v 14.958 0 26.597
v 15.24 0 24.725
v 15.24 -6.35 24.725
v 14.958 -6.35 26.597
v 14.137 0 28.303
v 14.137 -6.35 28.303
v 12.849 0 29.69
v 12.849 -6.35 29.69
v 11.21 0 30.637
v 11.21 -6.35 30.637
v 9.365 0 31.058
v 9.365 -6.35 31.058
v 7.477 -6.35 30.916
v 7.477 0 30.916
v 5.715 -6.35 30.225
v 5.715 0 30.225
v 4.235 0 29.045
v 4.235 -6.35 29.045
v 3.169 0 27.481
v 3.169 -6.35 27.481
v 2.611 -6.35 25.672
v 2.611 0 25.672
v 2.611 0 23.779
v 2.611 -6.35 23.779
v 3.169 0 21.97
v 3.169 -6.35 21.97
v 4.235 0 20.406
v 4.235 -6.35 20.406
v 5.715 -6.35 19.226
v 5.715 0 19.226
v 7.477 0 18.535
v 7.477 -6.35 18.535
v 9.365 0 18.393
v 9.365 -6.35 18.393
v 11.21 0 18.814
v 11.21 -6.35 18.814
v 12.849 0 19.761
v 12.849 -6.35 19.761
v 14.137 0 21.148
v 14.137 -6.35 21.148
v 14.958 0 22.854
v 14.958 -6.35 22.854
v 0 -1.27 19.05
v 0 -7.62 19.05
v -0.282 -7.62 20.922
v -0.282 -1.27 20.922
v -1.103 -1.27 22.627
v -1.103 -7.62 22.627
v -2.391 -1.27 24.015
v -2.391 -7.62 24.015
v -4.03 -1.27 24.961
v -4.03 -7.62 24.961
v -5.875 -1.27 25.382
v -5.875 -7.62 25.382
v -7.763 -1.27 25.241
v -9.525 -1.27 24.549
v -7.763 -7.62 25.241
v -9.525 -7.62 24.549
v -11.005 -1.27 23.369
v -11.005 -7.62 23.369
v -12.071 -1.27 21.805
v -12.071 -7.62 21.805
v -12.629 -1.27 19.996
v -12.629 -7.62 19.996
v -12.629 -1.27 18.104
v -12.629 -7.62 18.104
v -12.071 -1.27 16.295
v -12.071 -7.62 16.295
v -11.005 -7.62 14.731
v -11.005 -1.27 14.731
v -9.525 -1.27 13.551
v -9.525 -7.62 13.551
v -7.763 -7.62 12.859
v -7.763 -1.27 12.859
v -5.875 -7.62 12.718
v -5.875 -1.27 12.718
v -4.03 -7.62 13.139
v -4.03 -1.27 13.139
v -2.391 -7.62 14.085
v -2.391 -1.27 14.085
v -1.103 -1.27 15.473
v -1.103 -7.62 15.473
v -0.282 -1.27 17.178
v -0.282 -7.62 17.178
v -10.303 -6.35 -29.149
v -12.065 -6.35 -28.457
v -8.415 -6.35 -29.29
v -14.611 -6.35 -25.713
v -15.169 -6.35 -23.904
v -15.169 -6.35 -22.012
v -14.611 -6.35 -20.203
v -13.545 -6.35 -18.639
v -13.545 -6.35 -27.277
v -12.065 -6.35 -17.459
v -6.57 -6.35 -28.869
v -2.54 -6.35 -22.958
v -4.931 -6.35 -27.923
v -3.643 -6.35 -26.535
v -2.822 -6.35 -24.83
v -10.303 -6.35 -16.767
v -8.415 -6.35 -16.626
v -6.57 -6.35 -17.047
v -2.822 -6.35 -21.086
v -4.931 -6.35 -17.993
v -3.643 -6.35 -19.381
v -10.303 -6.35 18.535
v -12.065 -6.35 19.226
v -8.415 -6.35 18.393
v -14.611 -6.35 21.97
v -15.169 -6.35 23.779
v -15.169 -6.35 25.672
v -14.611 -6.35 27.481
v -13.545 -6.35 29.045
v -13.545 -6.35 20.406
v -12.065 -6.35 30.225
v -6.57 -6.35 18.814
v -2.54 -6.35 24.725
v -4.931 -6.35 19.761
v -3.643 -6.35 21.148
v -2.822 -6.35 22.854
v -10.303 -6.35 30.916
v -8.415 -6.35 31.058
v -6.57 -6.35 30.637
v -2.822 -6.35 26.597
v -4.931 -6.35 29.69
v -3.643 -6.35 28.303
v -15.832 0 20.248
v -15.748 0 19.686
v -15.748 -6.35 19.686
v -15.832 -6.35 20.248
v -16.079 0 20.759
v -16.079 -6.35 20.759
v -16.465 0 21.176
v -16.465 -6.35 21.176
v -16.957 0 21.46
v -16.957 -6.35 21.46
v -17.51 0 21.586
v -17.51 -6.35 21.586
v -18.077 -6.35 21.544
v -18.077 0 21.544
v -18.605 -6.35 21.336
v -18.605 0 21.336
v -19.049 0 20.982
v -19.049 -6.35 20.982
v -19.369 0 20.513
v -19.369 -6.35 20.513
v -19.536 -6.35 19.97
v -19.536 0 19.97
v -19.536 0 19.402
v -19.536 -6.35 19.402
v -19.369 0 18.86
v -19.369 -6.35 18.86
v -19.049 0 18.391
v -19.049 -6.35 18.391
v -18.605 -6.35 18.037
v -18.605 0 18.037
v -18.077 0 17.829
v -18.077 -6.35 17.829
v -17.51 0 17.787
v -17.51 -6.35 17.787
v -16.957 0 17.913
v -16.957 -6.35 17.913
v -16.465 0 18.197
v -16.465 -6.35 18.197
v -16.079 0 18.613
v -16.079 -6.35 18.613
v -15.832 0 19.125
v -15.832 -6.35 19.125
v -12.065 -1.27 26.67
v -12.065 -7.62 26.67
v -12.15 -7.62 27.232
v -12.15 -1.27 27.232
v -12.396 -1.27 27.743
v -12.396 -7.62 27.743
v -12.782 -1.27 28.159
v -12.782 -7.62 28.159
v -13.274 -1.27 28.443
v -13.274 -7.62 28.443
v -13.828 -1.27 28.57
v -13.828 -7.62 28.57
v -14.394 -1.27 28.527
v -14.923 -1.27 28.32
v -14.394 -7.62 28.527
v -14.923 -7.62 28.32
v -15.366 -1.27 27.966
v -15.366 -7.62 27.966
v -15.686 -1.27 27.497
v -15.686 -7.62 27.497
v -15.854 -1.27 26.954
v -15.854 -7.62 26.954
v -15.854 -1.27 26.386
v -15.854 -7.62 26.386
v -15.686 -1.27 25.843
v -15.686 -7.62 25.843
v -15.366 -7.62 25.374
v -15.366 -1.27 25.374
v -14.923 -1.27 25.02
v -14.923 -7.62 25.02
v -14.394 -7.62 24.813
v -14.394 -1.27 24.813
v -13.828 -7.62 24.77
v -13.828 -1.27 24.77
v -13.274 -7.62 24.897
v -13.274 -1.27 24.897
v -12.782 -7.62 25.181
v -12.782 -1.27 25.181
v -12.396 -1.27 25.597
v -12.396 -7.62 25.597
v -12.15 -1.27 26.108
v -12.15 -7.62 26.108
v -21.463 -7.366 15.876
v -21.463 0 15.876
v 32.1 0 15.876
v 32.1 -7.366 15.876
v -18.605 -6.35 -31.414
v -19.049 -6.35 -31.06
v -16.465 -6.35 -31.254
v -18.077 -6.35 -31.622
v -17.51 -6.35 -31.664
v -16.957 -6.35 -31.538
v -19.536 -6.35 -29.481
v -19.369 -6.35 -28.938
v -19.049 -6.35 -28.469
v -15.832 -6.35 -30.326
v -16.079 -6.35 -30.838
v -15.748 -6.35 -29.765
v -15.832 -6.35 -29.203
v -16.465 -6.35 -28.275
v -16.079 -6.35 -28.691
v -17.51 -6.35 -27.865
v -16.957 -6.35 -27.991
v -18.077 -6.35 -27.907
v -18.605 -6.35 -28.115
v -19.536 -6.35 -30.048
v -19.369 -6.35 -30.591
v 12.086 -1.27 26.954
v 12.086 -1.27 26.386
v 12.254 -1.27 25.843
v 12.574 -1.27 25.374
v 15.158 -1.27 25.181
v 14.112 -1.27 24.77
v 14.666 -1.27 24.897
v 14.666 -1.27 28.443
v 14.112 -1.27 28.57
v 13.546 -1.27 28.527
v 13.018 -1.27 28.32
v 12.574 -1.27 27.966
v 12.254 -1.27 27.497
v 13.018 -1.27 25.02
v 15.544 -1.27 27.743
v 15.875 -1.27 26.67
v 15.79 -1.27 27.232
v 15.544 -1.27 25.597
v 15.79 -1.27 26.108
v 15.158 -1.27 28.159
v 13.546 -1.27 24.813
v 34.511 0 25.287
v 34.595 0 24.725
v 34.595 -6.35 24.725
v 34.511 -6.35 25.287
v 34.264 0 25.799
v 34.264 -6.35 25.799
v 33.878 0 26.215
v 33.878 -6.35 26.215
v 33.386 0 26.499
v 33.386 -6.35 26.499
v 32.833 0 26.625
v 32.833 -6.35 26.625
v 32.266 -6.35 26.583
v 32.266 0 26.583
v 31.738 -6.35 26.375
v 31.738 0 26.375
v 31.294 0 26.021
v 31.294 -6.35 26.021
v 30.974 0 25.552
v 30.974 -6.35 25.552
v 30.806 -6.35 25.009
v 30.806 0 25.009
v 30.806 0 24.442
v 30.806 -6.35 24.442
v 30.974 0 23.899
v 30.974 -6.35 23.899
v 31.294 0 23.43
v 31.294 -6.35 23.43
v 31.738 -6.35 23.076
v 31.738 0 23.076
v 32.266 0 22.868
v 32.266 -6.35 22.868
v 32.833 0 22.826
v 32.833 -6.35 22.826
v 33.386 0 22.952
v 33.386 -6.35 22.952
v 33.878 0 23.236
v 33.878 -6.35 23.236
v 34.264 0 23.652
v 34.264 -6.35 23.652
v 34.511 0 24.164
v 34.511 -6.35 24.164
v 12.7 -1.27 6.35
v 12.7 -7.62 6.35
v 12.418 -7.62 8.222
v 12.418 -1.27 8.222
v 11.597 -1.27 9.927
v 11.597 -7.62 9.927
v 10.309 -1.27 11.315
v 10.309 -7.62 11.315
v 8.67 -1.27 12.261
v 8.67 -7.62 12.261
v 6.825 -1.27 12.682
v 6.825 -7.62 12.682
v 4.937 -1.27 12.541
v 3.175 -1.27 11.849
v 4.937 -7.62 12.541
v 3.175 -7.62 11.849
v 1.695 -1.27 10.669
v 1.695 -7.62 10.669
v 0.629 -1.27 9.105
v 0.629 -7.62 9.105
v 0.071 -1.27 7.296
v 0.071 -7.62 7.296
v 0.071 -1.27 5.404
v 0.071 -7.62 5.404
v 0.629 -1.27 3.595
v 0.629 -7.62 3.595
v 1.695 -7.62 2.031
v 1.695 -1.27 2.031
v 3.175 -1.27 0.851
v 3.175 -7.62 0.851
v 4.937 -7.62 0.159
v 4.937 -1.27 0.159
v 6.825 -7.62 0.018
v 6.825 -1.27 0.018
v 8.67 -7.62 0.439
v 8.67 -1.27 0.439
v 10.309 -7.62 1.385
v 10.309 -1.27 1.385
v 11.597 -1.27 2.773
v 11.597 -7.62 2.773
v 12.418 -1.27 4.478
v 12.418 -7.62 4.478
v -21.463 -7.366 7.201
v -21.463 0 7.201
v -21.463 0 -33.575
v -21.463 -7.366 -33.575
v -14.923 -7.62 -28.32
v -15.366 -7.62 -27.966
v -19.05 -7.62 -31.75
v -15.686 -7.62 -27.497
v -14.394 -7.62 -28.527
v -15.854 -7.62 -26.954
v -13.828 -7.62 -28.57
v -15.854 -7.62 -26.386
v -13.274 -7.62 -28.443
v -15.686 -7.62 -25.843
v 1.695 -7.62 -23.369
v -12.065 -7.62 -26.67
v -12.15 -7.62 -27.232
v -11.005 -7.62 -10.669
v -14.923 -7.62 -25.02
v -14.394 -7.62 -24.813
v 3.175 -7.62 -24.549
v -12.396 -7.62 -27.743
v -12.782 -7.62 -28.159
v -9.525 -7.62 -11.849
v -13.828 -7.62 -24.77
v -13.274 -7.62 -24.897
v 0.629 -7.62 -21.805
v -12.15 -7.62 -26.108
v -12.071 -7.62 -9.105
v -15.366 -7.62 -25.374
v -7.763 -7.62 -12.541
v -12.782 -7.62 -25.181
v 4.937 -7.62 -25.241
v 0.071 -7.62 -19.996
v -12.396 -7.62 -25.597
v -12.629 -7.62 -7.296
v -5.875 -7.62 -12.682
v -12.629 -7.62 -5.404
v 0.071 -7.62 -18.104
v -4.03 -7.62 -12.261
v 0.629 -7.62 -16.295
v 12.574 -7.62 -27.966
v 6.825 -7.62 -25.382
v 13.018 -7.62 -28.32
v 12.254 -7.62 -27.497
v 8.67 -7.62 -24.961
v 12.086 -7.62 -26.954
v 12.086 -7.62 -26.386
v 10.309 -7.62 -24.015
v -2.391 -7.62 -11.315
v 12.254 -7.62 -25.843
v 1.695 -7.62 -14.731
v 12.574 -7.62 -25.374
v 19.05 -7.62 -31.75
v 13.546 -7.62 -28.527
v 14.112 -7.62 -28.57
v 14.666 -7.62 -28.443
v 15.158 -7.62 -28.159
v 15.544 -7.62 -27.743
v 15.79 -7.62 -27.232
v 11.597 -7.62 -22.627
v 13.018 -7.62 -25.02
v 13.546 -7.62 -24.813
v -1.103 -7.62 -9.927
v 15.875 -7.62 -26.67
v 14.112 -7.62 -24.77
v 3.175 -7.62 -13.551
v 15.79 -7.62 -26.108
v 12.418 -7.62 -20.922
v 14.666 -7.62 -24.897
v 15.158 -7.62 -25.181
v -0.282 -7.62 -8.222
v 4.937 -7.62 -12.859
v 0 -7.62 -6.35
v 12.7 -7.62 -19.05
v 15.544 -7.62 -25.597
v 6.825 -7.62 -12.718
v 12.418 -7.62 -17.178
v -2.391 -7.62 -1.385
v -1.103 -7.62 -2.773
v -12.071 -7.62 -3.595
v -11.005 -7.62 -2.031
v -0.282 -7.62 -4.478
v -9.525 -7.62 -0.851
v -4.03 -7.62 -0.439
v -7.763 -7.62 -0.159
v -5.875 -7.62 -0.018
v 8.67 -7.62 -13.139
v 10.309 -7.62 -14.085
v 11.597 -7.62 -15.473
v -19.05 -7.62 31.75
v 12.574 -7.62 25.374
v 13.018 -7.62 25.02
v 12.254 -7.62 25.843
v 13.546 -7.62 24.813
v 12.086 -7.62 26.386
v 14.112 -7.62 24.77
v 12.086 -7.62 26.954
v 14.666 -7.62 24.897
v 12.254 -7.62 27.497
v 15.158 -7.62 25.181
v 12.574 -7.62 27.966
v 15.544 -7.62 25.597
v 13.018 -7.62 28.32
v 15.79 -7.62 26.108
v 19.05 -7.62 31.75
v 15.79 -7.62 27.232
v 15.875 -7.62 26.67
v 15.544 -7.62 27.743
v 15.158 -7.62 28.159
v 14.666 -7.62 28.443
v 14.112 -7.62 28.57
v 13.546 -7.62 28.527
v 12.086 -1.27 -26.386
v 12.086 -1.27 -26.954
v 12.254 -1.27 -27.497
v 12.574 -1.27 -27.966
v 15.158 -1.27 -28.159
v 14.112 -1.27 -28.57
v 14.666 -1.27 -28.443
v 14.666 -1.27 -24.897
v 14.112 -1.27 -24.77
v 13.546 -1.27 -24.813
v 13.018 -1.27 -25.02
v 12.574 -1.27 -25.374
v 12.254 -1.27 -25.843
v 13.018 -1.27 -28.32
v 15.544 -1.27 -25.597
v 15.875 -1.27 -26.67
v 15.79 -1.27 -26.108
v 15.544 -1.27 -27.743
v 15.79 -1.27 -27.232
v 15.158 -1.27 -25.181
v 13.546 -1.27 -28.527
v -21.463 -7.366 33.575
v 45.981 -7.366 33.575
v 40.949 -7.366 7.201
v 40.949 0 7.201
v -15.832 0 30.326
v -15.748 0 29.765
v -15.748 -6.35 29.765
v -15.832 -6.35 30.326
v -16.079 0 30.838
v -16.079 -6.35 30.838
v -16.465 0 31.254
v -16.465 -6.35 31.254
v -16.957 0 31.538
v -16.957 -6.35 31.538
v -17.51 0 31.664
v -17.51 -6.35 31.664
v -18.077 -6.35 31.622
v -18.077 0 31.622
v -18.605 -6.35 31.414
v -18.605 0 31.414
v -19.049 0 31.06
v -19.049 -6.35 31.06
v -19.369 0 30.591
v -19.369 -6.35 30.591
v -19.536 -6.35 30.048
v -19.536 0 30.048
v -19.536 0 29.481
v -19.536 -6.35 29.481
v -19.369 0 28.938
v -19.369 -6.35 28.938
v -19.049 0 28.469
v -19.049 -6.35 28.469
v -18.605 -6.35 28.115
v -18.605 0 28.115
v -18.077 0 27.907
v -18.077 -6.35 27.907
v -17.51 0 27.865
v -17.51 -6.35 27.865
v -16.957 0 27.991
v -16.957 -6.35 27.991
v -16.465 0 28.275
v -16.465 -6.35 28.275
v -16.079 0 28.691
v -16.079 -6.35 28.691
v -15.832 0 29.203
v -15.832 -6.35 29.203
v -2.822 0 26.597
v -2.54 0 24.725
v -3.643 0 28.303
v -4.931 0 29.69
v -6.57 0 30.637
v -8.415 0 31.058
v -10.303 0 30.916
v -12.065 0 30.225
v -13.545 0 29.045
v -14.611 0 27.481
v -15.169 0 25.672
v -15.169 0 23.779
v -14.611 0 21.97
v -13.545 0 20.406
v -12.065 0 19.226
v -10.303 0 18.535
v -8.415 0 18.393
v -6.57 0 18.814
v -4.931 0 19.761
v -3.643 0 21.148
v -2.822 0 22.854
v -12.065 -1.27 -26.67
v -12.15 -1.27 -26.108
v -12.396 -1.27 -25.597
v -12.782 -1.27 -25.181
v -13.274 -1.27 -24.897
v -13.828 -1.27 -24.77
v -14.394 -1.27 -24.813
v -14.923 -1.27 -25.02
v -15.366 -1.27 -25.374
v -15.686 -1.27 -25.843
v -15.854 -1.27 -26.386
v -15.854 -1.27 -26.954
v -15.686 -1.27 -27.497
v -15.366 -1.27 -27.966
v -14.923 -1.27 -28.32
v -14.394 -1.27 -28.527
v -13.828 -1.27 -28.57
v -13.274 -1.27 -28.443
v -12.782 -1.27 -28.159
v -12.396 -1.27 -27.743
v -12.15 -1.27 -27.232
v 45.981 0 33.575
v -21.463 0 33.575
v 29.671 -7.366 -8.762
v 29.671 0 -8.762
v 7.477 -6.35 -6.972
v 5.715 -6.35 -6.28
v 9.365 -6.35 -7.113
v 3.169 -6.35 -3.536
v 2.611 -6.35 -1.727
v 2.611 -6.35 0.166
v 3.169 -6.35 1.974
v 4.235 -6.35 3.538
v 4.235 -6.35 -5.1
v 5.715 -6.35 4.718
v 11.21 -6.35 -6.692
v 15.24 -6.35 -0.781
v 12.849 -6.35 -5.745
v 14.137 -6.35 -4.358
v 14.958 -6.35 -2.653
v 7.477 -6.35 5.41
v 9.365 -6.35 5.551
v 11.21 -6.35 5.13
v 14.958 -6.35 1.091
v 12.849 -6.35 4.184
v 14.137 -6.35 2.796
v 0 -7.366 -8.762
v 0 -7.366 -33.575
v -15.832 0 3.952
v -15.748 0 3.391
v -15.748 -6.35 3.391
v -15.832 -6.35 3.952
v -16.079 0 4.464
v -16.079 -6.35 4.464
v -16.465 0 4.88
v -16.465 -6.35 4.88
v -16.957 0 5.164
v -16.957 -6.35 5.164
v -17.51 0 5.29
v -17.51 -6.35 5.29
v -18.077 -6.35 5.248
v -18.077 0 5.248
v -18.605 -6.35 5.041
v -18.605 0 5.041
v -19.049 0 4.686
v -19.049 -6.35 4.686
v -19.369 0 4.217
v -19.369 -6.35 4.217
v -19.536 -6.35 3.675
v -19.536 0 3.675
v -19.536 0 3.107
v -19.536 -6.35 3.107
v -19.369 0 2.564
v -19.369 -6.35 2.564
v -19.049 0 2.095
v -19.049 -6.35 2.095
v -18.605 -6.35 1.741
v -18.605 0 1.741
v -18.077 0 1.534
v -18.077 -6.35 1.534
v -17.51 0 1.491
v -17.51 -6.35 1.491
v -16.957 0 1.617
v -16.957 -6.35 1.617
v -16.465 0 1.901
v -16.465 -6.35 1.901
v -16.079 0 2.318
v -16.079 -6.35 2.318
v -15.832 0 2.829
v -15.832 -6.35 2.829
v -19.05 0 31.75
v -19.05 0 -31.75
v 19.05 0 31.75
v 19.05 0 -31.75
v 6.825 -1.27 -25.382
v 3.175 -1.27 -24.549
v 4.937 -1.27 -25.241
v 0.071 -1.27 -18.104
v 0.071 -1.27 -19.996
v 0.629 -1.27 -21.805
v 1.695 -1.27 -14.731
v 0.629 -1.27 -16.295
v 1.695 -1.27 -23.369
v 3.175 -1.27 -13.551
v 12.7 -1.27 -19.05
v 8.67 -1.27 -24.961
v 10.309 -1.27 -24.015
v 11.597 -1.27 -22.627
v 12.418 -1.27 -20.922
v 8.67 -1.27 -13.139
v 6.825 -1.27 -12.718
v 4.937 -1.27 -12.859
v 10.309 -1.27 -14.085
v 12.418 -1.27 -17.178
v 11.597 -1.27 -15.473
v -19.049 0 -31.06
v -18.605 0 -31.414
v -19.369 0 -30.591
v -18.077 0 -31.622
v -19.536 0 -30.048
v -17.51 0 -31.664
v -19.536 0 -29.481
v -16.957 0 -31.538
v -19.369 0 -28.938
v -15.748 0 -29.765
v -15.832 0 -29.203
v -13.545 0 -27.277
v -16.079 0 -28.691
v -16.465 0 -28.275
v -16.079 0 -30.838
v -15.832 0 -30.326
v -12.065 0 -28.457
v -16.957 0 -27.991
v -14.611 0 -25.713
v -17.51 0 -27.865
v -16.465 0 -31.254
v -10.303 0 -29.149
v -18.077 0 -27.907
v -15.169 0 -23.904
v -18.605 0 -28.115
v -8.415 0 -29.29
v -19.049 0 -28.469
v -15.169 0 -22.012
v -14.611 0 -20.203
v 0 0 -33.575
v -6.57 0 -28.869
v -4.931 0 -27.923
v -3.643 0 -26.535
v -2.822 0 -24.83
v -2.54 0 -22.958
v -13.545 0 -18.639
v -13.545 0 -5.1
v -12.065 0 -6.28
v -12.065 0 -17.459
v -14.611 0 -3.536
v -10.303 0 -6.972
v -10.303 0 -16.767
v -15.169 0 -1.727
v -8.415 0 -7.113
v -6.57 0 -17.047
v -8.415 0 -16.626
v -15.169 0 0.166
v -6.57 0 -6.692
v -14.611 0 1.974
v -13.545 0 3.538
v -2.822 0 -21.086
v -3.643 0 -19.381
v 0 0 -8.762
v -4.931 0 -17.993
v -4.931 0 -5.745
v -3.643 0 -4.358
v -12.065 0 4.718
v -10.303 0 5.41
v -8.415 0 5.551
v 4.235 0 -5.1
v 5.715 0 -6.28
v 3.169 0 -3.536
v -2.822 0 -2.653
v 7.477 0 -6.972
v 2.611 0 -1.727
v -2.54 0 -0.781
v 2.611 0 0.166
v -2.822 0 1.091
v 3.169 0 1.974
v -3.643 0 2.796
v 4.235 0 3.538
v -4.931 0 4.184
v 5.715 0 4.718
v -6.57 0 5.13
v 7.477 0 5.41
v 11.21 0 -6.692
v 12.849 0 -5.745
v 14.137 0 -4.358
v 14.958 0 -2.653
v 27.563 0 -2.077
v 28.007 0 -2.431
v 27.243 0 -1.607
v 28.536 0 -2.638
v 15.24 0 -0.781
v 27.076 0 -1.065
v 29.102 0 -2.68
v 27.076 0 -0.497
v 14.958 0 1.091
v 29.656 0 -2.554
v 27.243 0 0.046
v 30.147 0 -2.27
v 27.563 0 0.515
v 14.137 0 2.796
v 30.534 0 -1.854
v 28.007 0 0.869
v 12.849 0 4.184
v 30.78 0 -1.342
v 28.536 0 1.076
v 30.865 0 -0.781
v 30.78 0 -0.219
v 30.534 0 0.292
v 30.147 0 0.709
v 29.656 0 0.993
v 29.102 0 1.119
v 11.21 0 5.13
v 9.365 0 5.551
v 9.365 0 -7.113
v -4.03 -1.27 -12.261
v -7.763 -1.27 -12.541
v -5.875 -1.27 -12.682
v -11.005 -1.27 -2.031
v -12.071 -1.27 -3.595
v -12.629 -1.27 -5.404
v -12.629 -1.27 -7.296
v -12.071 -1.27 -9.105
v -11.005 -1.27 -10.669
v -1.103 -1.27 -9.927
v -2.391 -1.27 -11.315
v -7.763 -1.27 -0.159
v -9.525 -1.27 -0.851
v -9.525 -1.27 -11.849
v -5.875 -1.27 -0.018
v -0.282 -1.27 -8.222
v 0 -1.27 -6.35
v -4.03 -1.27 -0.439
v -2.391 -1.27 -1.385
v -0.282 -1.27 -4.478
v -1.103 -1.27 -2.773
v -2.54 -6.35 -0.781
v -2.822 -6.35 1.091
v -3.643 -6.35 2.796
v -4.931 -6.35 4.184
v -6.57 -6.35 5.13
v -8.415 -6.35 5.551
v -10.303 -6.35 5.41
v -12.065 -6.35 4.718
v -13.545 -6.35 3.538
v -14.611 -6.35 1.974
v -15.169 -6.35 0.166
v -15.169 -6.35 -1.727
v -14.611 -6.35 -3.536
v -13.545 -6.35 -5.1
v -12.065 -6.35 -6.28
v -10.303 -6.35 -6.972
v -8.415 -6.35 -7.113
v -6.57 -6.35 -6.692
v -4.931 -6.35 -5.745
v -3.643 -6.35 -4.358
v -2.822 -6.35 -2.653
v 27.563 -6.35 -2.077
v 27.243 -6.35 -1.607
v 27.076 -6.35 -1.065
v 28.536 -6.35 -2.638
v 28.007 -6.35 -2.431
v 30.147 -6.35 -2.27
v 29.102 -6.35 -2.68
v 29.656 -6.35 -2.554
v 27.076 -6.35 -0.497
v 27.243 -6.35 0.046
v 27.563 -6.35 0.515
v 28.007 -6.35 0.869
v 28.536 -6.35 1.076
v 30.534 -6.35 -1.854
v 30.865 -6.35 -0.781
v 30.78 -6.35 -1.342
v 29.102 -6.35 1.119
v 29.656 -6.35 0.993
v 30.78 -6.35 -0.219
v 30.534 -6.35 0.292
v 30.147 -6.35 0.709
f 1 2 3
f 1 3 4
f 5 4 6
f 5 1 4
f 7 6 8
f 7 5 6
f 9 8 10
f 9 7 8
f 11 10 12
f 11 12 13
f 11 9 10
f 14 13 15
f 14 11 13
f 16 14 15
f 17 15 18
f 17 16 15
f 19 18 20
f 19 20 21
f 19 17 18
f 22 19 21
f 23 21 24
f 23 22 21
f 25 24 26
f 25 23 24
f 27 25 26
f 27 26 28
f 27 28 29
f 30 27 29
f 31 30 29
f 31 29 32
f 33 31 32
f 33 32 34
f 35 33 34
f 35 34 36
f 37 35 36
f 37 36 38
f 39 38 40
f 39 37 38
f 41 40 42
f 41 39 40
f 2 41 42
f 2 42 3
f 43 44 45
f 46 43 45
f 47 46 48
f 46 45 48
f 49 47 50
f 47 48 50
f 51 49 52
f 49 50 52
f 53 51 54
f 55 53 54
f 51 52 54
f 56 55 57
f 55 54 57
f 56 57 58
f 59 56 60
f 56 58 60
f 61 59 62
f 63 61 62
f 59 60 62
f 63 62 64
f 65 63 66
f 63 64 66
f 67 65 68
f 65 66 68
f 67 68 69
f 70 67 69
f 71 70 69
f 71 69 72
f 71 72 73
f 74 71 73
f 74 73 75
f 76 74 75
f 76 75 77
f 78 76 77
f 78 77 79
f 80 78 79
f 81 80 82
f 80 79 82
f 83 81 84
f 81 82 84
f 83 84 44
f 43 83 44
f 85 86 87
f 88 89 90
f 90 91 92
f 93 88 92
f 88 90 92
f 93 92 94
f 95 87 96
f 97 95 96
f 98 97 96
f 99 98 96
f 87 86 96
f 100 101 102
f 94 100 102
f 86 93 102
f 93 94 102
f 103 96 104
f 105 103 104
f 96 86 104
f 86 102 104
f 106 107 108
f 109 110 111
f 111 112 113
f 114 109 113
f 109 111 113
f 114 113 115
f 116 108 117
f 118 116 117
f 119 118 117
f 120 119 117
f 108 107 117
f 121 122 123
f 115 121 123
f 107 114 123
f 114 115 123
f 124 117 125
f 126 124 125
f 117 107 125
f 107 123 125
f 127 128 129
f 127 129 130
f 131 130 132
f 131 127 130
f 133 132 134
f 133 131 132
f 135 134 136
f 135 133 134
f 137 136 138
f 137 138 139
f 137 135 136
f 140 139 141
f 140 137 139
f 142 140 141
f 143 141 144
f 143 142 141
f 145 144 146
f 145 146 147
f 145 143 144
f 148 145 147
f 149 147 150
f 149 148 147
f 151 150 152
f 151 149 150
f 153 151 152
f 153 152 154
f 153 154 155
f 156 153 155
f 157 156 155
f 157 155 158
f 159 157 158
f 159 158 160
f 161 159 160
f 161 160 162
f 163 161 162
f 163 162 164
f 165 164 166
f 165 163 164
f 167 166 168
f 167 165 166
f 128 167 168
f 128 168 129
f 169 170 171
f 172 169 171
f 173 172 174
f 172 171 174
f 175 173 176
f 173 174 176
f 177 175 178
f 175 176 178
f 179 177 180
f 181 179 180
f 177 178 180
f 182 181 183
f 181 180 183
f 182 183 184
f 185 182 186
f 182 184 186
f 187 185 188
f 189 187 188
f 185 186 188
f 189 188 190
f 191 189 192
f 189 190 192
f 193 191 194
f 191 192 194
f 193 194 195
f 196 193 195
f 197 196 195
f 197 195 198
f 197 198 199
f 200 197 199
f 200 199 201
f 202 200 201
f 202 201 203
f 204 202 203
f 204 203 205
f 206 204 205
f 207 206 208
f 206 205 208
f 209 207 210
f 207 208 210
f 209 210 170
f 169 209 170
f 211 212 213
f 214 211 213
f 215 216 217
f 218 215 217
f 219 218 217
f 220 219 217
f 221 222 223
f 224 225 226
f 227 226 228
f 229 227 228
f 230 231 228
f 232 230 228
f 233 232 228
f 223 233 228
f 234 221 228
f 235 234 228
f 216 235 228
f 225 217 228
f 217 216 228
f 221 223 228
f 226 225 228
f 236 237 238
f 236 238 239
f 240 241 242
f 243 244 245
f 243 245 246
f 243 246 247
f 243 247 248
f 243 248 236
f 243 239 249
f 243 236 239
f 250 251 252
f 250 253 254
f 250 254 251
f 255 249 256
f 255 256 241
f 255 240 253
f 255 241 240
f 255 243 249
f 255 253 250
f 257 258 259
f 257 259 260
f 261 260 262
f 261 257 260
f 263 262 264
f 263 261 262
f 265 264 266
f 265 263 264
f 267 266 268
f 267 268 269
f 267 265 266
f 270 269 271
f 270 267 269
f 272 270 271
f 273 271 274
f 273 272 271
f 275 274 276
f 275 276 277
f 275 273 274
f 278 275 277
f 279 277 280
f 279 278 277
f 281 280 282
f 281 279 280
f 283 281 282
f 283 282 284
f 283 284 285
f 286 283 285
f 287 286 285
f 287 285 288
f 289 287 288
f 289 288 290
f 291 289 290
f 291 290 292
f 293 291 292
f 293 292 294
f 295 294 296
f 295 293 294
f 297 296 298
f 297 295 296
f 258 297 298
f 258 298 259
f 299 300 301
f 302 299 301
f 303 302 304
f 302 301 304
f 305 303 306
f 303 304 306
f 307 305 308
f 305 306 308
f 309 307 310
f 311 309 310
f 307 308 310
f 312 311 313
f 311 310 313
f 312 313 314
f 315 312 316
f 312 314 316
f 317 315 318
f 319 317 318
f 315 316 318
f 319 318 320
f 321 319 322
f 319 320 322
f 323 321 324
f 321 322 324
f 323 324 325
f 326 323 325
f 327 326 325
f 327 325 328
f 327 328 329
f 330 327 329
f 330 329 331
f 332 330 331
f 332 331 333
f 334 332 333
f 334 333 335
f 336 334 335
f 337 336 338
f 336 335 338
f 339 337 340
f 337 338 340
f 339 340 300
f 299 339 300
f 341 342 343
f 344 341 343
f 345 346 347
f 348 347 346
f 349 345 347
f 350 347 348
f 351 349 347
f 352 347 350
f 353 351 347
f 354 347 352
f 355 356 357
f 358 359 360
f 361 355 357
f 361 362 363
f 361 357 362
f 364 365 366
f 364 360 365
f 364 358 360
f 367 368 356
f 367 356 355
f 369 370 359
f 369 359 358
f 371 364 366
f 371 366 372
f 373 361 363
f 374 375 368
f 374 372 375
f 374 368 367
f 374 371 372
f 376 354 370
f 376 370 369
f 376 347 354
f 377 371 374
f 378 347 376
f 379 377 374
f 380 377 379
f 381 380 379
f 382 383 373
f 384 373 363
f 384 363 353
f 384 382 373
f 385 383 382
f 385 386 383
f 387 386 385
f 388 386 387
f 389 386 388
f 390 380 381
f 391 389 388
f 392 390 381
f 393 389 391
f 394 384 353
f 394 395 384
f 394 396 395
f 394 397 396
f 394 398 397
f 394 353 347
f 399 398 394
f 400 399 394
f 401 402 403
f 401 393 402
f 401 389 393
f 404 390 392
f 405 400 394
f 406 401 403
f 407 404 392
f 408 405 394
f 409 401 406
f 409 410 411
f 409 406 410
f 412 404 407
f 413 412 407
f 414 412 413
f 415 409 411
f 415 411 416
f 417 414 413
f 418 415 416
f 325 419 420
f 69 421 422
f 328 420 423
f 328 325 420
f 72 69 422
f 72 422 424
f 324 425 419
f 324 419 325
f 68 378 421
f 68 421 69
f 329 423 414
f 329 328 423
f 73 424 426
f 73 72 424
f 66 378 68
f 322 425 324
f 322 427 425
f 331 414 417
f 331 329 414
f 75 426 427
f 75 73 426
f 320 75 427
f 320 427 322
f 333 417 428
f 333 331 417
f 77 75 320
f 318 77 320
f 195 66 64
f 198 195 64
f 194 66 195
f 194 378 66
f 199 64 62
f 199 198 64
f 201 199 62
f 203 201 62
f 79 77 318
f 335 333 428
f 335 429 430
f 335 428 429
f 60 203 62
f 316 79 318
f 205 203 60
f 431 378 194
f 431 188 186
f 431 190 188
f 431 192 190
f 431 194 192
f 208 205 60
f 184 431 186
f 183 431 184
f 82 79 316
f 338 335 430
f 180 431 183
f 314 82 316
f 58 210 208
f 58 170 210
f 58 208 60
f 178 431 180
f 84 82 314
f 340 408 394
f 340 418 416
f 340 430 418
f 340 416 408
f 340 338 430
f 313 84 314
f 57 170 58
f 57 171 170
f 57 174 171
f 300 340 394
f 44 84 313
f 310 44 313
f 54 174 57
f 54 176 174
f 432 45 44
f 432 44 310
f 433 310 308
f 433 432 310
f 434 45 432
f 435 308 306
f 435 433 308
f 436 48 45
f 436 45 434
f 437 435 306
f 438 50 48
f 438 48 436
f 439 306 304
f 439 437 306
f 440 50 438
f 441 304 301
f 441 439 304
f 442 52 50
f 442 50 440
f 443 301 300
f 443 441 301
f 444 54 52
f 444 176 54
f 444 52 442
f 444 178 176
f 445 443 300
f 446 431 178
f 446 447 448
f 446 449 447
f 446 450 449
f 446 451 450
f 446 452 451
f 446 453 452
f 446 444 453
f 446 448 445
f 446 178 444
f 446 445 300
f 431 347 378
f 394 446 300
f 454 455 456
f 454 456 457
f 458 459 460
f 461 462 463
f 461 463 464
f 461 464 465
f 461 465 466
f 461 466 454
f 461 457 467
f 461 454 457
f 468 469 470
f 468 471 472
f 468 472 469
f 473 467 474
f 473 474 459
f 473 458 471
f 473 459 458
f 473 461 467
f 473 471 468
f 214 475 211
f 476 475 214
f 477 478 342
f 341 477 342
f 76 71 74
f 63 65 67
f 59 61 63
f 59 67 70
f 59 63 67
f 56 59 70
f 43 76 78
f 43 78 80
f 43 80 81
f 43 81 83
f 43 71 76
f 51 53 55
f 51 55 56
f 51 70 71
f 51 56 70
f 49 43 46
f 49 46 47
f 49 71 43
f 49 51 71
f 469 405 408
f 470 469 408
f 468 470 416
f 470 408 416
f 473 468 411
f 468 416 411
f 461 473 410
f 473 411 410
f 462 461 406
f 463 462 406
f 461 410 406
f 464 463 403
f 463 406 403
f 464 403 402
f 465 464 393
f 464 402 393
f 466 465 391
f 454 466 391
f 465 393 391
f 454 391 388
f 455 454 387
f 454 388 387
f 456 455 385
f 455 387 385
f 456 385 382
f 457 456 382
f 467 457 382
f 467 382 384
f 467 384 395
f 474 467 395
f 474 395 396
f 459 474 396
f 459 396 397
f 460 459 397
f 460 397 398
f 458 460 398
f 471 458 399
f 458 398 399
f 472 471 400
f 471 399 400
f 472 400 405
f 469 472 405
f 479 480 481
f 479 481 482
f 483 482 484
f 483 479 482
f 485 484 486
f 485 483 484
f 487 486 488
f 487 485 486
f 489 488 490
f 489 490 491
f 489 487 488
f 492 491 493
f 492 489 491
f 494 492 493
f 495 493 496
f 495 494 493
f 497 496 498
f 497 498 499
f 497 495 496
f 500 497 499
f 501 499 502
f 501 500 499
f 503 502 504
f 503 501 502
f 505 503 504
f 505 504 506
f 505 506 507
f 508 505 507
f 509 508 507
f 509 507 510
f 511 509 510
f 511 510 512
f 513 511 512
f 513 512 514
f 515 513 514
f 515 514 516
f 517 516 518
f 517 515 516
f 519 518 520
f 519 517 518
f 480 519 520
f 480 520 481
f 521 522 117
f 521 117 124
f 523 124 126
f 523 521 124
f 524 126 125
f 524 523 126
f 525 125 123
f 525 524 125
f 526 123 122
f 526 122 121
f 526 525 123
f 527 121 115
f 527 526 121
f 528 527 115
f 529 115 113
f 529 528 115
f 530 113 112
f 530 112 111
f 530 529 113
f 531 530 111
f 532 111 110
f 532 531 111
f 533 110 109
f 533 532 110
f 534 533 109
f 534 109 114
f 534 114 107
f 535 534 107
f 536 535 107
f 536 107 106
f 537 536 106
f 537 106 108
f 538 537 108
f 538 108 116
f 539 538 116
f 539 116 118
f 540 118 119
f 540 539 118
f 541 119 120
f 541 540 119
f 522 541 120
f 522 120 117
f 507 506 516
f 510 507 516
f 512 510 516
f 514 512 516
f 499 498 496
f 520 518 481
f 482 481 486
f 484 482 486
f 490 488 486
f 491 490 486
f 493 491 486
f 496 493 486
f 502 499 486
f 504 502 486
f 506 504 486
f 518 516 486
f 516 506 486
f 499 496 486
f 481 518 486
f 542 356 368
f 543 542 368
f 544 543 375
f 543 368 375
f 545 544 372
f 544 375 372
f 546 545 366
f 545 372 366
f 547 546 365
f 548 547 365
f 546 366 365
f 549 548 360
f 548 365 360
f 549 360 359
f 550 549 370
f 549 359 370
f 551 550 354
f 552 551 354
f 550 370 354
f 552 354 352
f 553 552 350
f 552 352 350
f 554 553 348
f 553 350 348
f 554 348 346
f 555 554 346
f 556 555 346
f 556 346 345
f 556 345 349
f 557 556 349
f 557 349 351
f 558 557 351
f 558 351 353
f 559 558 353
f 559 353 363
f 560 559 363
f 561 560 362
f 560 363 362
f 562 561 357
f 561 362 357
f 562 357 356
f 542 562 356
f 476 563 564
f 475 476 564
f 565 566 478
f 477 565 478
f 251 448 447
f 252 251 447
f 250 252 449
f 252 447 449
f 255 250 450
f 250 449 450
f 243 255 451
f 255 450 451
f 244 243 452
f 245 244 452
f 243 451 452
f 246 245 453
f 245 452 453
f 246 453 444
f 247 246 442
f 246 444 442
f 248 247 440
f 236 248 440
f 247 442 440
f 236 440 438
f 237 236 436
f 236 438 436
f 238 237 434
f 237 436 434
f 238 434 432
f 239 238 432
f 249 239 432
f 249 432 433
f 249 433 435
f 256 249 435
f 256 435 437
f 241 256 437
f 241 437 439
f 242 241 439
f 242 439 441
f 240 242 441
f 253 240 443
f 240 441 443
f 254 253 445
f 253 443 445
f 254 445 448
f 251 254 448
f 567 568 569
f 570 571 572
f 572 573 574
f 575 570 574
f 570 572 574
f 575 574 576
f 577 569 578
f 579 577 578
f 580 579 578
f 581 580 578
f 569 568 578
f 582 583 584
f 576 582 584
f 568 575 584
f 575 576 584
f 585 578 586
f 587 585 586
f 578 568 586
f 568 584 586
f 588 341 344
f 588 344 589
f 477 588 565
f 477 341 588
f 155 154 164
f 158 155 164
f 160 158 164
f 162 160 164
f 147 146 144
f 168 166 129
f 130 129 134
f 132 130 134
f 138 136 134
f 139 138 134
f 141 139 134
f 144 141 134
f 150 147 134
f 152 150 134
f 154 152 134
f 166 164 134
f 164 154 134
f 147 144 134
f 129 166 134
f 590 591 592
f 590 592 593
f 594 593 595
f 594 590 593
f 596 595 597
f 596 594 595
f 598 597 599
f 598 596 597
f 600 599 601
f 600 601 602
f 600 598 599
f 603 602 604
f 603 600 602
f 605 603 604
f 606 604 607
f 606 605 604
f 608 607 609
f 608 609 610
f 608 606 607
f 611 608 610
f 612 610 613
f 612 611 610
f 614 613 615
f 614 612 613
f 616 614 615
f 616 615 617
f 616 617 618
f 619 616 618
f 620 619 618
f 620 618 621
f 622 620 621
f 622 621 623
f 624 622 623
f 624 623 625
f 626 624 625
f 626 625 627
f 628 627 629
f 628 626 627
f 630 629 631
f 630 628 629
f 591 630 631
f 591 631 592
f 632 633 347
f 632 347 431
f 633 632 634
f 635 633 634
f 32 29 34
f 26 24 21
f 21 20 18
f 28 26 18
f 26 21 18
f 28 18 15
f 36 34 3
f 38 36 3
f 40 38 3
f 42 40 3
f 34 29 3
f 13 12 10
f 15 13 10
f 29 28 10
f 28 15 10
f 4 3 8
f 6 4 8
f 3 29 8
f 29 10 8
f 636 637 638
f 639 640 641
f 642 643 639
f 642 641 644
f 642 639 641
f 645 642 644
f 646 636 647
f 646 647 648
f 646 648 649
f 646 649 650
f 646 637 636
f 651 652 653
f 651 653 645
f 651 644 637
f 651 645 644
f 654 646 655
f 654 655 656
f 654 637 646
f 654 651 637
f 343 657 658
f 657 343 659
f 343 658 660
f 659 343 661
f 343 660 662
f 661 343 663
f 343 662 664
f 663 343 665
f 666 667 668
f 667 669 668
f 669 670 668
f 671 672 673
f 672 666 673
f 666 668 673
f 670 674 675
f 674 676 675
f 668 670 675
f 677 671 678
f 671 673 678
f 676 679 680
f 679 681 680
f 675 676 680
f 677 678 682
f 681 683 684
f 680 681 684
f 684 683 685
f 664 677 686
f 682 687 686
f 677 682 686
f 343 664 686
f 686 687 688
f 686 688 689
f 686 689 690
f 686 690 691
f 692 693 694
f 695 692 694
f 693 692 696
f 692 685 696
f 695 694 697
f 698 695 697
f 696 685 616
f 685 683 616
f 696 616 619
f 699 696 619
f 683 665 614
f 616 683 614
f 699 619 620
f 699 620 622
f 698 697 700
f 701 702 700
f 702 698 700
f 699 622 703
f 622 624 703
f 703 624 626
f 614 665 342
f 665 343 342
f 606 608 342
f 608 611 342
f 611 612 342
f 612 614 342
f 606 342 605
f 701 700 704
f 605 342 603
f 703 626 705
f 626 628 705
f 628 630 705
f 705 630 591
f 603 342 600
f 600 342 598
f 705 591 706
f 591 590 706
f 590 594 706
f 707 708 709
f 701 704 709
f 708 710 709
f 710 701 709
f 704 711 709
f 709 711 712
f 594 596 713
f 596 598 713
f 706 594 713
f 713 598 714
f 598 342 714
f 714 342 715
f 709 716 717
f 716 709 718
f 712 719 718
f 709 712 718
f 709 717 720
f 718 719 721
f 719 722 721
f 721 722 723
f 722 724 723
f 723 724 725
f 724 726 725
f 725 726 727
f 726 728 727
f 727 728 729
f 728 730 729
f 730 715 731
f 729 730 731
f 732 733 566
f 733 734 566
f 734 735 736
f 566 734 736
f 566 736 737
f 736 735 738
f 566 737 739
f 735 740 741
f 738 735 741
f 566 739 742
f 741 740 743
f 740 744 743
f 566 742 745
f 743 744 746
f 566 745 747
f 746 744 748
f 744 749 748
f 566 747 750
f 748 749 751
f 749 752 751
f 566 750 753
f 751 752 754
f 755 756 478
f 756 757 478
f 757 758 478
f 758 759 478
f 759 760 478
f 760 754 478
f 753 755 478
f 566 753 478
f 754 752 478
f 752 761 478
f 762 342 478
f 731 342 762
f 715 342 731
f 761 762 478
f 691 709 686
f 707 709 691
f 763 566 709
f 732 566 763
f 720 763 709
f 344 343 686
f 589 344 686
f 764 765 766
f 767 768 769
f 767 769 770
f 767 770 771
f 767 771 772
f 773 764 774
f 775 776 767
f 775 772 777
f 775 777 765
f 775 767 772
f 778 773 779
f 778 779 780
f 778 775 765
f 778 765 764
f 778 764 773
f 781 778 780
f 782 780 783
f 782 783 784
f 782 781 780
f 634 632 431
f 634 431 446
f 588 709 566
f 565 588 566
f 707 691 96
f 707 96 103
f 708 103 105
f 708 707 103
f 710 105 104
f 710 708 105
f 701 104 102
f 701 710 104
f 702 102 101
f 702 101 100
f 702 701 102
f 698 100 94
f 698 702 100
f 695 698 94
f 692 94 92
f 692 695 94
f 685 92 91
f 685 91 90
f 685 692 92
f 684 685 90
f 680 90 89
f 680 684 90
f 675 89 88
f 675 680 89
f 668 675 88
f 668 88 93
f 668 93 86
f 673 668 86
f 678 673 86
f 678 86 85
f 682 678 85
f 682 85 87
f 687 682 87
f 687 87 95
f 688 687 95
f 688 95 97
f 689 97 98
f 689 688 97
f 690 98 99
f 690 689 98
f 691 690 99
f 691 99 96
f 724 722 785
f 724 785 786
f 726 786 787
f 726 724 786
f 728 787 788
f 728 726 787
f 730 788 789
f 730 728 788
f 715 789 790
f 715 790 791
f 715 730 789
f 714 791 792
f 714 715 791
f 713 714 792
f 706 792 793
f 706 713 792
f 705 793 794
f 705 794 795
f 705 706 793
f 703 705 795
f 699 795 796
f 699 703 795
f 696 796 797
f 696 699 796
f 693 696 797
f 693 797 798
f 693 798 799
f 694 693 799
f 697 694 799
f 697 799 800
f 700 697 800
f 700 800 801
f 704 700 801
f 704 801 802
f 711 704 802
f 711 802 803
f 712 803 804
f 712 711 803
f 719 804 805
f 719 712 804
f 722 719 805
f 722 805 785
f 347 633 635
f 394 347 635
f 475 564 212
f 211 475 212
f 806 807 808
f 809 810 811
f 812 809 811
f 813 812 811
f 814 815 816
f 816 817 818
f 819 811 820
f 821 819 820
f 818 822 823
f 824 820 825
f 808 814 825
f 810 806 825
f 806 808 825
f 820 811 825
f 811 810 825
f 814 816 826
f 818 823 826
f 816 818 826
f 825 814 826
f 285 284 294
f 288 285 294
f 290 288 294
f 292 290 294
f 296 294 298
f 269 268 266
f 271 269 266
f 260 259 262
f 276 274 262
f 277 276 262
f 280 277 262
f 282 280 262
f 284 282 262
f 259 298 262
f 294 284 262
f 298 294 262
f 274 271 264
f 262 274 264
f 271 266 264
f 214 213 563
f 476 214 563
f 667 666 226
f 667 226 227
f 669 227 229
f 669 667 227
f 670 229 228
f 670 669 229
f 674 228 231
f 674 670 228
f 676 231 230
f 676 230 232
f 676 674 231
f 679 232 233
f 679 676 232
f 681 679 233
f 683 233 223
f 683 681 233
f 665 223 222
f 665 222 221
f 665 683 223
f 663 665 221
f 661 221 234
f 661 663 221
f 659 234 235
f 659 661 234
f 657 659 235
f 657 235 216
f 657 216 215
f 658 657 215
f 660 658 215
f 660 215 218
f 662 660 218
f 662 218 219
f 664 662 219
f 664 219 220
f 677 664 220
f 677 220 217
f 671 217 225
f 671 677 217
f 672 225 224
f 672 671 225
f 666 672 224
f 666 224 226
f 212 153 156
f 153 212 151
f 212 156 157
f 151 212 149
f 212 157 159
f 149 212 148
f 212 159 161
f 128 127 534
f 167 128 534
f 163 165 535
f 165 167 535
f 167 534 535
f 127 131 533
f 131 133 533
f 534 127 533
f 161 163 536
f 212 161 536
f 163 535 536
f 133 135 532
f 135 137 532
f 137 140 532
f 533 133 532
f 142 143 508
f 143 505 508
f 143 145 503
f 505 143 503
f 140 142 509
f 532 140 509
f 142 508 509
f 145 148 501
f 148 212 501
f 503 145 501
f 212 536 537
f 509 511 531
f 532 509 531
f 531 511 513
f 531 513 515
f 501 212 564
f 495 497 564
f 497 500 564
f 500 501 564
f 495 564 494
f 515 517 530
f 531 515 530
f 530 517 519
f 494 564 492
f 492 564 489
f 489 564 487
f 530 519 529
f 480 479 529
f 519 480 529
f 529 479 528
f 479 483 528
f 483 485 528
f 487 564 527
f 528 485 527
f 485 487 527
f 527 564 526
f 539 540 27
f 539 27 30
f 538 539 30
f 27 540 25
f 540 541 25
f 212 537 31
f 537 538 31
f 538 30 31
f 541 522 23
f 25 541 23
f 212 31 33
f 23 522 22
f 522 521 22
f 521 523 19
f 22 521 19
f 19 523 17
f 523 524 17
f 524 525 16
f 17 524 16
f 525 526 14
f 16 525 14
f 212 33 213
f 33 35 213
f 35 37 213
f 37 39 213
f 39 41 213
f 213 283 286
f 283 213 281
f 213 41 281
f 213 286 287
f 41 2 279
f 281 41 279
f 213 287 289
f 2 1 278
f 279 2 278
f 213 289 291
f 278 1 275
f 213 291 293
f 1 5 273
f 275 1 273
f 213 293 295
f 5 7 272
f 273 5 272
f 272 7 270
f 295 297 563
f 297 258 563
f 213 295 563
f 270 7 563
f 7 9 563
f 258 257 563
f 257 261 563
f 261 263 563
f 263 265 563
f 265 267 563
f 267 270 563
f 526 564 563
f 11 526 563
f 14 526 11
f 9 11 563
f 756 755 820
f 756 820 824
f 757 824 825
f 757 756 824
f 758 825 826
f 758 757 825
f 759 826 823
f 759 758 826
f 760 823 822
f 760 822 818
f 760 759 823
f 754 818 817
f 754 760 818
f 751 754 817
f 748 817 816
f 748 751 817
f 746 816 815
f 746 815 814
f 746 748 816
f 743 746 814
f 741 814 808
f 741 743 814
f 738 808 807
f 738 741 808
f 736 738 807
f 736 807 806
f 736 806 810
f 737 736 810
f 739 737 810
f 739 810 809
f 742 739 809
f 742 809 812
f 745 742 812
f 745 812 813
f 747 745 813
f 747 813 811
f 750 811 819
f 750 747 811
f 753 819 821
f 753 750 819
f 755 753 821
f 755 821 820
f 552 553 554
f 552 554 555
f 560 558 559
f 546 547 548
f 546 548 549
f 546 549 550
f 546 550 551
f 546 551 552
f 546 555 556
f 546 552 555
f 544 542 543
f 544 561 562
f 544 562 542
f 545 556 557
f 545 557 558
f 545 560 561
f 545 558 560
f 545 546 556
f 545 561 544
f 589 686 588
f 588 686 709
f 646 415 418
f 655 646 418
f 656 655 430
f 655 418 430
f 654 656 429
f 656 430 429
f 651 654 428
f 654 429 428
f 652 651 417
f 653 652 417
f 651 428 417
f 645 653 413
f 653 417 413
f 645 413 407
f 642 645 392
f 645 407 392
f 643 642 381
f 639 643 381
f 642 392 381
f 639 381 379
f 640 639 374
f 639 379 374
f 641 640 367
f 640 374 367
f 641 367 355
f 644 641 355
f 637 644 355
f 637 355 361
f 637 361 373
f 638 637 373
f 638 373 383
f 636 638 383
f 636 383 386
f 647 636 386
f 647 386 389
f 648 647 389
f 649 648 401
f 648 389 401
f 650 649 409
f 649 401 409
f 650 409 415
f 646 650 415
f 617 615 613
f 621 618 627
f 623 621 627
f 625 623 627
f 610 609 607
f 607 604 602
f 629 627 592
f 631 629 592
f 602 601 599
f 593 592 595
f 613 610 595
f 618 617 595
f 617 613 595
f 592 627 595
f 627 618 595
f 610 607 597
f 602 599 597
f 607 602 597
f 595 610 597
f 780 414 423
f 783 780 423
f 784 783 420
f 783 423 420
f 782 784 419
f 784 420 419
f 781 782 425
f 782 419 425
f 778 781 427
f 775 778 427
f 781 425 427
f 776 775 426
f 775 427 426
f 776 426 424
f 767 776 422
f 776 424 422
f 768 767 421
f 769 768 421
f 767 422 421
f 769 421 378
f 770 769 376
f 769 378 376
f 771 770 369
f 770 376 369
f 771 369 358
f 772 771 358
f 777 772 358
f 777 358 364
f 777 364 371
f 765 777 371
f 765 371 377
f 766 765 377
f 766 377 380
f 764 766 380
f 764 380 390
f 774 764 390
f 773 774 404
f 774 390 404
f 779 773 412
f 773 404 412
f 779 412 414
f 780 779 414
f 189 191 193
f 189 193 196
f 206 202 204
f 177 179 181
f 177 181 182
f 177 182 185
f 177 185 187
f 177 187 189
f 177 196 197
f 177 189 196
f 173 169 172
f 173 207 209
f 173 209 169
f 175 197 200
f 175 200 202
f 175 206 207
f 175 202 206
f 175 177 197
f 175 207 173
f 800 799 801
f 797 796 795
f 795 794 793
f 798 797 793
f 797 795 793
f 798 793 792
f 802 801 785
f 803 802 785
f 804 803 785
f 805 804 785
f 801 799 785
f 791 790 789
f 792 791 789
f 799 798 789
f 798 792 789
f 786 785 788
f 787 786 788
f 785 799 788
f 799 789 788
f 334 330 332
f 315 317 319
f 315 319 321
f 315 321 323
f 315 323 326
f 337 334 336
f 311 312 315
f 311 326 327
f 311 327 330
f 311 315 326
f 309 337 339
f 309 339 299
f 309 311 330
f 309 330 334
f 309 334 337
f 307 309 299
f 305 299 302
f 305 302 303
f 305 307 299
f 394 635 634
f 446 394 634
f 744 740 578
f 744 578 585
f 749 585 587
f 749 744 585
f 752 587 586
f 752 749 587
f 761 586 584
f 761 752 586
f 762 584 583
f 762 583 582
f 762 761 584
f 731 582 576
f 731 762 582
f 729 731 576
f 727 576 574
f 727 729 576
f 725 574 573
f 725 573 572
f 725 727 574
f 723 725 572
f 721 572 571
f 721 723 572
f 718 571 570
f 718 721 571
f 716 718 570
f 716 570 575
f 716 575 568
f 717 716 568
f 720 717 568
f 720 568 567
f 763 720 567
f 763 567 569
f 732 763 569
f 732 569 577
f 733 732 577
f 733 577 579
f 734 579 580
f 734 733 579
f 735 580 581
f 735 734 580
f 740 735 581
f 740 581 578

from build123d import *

# Parameters (mm, degrees)
F1_DEPTH = 7.366
F3_W     = 38.1
F3_H     = 63.5
F4_DEPTH = 7.62
F5_R     = 6.35
F5_R_2   = 1.905
F6_DEPTH = 6.35
F2_R     = 6.35
F2_R_2   = 1.905
F7_DEPTH = 6.35


# Not quite as in the source:
# - a feature of the source that left no trace in its solid (it failed there, or was rolled back) is left out


with BuildPart() as f1:
    # F0 (on Front) → F1 (new body)
    with BuildSketch(Plane.XZ):
        Polygon((40.94883606, 7.20073871), (-21.4626698, 7.20073871), (-21.4626698, -33.57456201), (0, -33.57456201), (0, -8.76236119), (29.67054772, -8.76236119), align=None)
    extrude(amount=F1_DEPTH)


with BuildPart() as f1b:
    # F0 (on Front) → F1, piece 2 (new body)
    with BuildSketch(Plane.XZ):
        Polygon((-21.4626698, 15.87636017), (32.0997072, 15.87636017), (45.98066242, 33.57456201), (-21.4626698, 33.57456201), align=None)
    extrude(amount=F1_DEPTH)


with BuildPart() as f4:
    # F3 (on Front) → F4 (new body)
    with BuildSketch(Plane.XZ):
        Rectangle(F3_W, F3_H)
    extrude(amount=F4_DEPTH)

    # F5 (on face) → F6 (cut)
    with BuildSketch(Plane.XZ.offset(7.62)):
        with Locations((-6.35, 19.05)):
            Circle(F5_R)
        with Locations((6.35, 6.35)):
            Circle(F5_R)
        with Locations((-6.35, -6.35)):
            Circle(F5_R)
        with Locations((6.35, -19.05)):
            Circle(F5_R)
        with Locations((13.97, 26.67)):
            Circle(F5_R_2)
        with Locations((13.97, -26.67)):
            Circle(F5_R_2)
        with Locations((-13.97, -26.67)):
            Circle(F5_R_2)
        with Locations((-13.97, 26.67)):
            Circle(F5_R_2)
    extrude(amount=-F6_DEPTH, mode=Mode.SUBTRACT)


with BuildPart() as f7_tool:
    # F2 (on face) → F7 (new body)
    with BuildSketch(Plane.XZ):
        with Locations((-8.89, 24.72546109)):
            Circle(F2_R)
        with Locations((8.89, 24.72546109)):
            Circle(F2_R)
        with Locations((8.89, -0.78081124)):
            Circle(F2_R)
        with Locations((-8.89, -0.78081124)):
            Circle(F2_R)
        with Locations((-8.89, -22.9579730041)):
            Circle(F2_R)
        with Locations((32.69018481, 24.72546109)):
            Circle(F2_R_2)
        with Locations((-17.6526698, 29.76456201)):
            Circle(F2_R_2)
        with Locations((-17.6526698, 19.68636017)):
            Circle(F2_R_2)
        with Locations((28.95969189, -0.78081124)):
            Circle(F2_R_2)
        with Locations((-17.6526698, 3.39073871)):
            Circle(F2_R_2)
        with Locations((-17.6526698, -29.76456201)):
            Circle(F2_R_2)
    extrude(amount=F7_DEPTH)


with BuildPart() as f1_1:
    add(f1.part)

    # F7: cut by f7_tool
    add(f7_tool.part, mode=Mode.SUBTRACT)


with BuildPart() as f1b_1:
    add(f1b.part)

    # F7: cut by f7_tool
    add(f7_tool.part, mode=Mode.SUBTRACT)


solid = Compound([f4.part, f1_1.part, f1b_1.part])
